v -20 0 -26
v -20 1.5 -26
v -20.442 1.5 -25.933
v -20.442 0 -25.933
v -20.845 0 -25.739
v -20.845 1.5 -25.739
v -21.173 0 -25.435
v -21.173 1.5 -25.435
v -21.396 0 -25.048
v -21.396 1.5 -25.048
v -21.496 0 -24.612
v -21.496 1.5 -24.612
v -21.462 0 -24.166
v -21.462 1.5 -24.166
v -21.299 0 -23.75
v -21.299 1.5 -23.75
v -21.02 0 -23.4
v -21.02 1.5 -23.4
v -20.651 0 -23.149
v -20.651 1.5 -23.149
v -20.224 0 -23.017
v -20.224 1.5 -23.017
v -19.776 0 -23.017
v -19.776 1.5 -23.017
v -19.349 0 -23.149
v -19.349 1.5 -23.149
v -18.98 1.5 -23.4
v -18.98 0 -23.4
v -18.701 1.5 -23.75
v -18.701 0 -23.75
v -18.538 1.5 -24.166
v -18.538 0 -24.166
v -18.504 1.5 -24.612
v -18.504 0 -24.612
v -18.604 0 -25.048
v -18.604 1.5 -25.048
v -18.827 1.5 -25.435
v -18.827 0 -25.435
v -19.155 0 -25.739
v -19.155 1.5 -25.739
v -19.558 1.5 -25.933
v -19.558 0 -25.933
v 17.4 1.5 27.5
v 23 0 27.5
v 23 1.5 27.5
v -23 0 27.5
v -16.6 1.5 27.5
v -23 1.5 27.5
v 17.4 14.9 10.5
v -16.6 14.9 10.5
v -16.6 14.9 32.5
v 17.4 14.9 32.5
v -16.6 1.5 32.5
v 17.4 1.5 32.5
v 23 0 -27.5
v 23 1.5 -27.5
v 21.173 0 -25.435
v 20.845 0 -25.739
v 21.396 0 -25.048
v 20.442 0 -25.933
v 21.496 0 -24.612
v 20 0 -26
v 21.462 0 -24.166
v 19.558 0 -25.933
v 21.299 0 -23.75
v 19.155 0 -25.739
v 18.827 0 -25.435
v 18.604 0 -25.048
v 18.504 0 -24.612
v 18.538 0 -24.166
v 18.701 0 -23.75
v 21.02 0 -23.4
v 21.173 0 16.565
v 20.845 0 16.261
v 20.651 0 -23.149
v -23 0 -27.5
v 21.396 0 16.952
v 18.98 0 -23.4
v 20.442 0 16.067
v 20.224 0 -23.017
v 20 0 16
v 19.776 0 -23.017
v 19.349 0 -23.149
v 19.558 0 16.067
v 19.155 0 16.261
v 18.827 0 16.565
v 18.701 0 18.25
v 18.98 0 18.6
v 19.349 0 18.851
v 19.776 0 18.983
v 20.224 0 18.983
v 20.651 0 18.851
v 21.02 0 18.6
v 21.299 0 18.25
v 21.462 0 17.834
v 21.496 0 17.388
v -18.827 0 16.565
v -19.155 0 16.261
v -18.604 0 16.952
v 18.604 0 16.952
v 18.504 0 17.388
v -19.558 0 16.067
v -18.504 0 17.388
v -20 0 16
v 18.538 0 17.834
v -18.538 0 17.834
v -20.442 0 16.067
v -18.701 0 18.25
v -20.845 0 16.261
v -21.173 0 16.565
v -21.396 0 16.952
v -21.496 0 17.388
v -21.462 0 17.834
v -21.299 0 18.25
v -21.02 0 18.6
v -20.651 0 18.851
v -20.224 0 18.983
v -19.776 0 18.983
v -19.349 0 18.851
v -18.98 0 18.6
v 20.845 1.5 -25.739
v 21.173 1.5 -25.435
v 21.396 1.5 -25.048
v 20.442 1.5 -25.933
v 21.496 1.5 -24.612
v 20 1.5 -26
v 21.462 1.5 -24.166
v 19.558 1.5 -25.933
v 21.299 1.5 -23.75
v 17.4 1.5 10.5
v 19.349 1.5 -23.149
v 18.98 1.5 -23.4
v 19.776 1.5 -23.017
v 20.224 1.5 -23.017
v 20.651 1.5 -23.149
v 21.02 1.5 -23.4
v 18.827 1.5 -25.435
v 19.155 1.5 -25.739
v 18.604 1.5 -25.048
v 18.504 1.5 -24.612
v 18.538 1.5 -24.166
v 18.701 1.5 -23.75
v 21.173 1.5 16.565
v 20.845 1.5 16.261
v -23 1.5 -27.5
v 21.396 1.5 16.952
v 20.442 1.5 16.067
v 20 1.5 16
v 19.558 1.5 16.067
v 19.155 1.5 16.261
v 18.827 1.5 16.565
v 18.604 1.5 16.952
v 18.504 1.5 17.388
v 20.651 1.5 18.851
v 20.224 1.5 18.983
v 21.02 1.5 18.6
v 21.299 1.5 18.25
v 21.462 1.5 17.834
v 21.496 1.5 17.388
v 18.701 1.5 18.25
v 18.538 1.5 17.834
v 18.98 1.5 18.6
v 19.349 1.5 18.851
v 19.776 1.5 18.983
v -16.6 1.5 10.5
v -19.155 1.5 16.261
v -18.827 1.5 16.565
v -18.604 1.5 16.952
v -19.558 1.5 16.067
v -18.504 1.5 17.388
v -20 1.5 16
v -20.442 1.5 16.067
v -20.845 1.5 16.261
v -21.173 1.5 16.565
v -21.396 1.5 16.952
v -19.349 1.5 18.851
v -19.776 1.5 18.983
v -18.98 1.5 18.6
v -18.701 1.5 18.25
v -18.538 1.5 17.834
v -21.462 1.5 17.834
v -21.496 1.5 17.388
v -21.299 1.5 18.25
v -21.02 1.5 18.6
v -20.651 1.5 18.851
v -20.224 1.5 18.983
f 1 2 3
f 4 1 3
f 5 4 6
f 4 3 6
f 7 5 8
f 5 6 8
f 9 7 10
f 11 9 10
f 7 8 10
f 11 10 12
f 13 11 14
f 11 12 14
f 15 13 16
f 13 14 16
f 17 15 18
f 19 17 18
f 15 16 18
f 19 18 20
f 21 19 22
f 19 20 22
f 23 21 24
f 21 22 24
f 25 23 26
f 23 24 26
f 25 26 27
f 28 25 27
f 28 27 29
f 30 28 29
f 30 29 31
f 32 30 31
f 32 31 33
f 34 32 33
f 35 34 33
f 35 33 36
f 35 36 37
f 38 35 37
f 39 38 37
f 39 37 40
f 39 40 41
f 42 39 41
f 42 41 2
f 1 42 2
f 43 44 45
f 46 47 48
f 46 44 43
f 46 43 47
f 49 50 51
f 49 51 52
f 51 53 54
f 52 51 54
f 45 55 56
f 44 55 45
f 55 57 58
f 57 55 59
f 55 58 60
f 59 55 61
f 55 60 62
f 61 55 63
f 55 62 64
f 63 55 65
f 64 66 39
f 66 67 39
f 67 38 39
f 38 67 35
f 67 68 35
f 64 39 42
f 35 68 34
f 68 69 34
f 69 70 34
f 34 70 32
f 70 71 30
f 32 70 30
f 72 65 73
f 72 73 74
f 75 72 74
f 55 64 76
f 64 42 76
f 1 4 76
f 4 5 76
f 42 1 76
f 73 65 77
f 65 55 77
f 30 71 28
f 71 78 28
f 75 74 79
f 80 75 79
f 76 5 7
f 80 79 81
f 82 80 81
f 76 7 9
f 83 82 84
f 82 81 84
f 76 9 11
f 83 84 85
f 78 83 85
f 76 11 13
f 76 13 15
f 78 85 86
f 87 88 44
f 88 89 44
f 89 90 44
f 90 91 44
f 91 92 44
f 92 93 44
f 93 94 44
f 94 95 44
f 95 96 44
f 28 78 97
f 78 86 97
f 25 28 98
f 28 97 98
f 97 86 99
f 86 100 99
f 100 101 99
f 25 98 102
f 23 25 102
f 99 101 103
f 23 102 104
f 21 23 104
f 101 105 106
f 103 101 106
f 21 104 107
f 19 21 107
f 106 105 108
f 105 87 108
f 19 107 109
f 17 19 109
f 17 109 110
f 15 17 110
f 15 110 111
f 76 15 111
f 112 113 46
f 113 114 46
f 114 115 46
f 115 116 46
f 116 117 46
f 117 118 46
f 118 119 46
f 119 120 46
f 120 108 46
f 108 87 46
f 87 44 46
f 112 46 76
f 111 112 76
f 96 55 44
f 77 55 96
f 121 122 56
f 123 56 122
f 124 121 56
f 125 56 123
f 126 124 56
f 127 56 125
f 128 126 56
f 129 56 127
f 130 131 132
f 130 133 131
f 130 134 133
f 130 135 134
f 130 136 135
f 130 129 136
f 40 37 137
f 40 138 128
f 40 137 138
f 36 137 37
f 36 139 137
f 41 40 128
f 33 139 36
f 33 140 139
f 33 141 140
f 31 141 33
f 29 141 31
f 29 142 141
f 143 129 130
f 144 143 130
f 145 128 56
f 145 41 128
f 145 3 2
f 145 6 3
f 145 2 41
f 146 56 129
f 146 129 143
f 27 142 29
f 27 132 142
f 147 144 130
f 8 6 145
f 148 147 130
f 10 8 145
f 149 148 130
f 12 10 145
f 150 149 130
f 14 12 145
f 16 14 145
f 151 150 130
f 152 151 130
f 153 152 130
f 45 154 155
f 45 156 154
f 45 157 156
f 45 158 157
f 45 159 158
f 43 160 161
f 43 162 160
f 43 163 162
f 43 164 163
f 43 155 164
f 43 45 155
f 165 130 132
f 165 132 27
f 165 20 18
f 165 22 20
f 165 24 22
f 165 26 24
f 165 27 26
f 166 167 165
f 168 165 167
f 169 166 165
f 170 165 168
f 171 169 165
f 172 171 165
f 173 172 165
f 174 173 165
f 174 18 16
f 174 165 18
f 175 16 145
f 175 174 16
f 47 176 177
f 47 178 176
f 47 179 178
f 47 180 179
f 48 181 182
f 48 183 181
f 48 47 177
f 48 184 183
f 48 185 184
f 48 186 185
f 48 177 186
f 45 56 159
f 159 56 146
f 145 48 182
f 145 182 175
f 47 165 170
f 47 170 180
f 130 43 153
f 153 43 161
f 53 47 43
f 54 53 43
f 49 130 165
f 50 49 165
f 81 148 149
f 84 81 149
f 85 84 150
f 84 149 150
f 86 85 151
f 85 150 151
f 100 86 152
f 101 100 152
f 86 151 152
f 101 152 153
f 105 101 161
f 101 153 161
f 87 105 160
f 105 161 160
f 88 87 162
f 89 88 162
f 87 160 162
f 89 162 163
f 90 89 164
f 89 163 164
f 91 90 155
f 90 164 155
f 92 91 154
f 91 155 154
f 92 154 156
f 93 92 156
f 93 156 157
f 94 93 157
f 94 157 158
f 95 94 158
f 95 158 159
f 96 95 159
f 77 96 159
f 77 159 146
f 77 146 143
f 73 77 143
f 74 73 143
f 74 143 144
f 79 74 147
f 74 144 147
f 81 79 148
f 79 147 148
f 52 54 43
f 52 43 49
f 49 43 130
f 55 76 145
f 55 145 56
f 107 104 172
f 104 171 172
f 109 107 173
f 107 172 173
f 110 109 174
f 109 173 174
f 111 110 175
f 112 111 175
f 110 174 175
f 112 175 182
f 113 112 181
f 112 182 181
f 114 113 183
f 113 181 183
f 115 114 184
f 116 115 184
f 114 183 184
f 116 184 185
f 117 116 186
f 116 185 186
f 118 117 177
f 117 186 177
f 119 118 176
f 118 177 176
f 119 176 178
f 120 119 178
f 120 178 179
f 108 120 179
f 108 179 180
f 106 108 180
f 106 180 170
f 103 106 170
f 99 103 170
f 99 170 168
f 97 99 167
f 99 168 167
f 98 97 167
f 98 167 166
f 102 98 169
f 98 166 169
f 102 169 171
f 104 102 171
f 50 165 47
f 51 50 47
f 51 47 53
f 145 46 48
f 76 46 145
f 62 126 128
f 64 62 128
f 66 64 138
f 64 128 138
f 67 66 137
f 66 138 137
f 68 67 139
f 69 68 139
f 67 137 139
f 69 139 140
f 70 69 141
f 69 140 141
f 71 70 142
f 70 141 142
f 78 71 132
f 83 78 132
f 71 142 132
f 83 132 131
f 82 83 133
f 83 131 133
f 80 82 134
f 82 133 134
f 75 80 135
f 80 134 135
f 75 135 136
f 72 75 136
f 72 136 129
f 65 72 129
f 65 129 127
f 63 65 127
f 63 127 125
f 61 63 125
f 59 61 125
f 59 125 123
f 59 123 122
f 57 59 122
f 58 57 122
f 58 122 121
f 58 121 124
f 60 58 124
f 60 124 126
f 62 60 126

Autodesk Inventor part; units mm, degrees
ref_plane "YZ Plane" through (0, 0, 0) normal (1, 0, 0) x (0, 1, 0)
ref_plane "XZ Plane" through (0, 0, 0) normal (0, 1, 0) x (-1, 0, 0)
ref_plane "XY Plane" through (0, 0, 0) normal (0, 0, 1) x (1, 0, 0)
sketch "Sketch1" plane through (0, 0, 0) normal (0, 1, 0) x (-1, 0, 0)
  line L0 (-23, 27.5) -> (23, 27.5)
  line L1 (23, 27.5) -> (23, -27.5)
  line L2 (23, -27.5) -> (-23, -27.5)
  line L3 (-23, -27.5) -> (-23, 27.5)
  line L4 (-23, 27.5) -> (23, -27.5) construction
  line L5 (23, 27.5) -> (-23, -27.5) construction
  point P0 (0, 0)
  dimension "d0" = 46
  dimension "d1" = 55
extrude "Extrusion1" add sketch "Sketch1" along normal blind 1.5
sketch "Sketch2" plane through (0, 1.5, 0) normal (0, 1, 0) x (1, 0, 0)
  line L0 (-16.6, -32.5) -> (17.4, -32.5)
  line L1 (17.4, -32.5) -> (17.4, -10.5)
  line L2 (17.4, -10.5) -> (-16.6, -10.5)
  line L3 (-16.6, -10.5) -> (-16.6, -32.5)
  line L4 (-16.6, -32.5) -> (17.4, -10.5) construction
  line L5 (17.4, -32.5) -> (-16.6, -10.5) construction
  line L6 (-23, -27.5) -> (23, -27.5) projected
  line L7 (-23, 27.5) -> (-23, -27.5) projected
  point P0 (0, 0)
  point P1 (0.4, -21.5)
  dimension "d4" = 34
  dimension "d5" = 22
  dimension "d6" = 5
  dimension "d7" = 6.4
extrude "Extrusion2" add sketch "Sketch2" along normal blind 13.4
sketch "Sketch3" plane through (0, 0, 0) normal (0, -1, 0) x (1, 0, 0)
  line L0 (20, 17.5) -> (-20, 17.5) construction
  line L1 (-20, 17.5) -> (-20, -24.5) construction
  line L2 (-20, -24.5) -> (20, -24.5) construction
  line L3 (20, -24.5) -> (20, 17.5) construction
  line L4 (23, -27.5) -> (23, 27.5) construction
  line L5 (-23, 27.5) -> (-23, -27.5) projected
  line L6 (-23, -27.5) -> (23, -27.5) projected
  point P0 (0, 0)
  dimension "d10" = 42
  dimension "d11" = 40
  dimension "d12" = 3
  dimension "d13" = 3
  dimension "d14" = 3
hole "Hole1" at (20, 0, 17.5) at (-20, 0, 17.5) at (-20, 0, -24.5) at (20, 0, -24.5) direction (0, 1, 0) diameter 3 end through all
equation "\"d13\" = d12"
equation "\"d14\" = d12"
properties part number "board"
